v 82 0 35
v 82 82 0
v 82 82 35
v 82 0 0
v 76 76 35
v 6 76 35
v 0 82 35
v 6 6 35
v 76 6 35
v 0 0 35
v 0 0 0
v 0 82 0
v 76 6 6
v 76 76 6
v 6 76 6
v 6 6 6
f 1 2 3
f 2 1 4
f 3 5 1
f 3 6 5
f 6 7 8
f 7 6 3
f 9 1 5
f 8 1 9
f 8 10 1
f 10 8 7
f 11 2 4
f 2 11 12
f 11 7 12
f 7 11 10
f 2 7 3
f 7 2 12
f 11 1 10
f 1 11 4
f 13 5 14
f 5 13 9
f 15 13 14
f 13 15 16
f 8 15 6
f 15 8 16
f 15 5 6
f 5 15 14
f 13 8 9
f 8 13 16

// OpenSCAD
// file: lib/CMSL.scad
/*
 * CMSL - The chrissx Media SCAD library
 * Copyright 2021 chrissx Media, P. C. Häußler
 * For licensing information please refer to the 2nd version of the
 * GNU General Public License, as found in the repository you should have
 * obtained this file from, at https://github.com/pixelcmtd/models/tree/master/LICENSE.
 */

module CMMultiLineText(lines = [], size = 10, font = "Liberation Mono",
                       halign = "left", valign = "baseline",
                       direction = "ltr", hspace = 1, vspace = 3) {
  translate([0, -size, 0]) {
    for (i = [0 : len(lines) - 1]) {
      translate([0 , (-i - 0.5) * vspace, 0]) {
        text(text=lines[i], size=size, font=font, valign=valign, halign=halign,
             direction=direction, spacing=hspace);
      }
    }
  }
}

module CMBox(width=50, height=37.5, wall=1, fronttext=[],
             textsize=1.5, font="Liberation Mono", textdepth=1.5) {
  inner = width - wall * 2;
  union() {
    difference() {
      cube([width, width, height]);
      translate([wall, wall, wall])
        cube([inner, inner, height+1]);
    }
    translate([wall, 0, height-wall]) {
      rotate([90, 0, 0]) {
        linear_extrude(textdepth) {
          CMMultiLineText(fronttext, size=textsize, vspace=textsize, font=font);
        }
      }
    }
  }
}

module CMRing(inner, outer, height) {
  linear_extrude(height) {
    difference() {
      circle(outer);
      circle(inner);
    }
  }
}

module CMGear(inner, outer, height, n, thickness, width) {
  union() {
    CMRing(inner, outer, height);
    for(i = [0:n])
      rotate([0,0,i*360/n])
        translate([inner,0,0])
        cube([outer-inner+thickness, width, height]);
  }
}
// main file
/// An 82²x35 CMBox with a wall-thickness of 6
/// made to be close to the SchoolAmp project.

use <lib/CMSL.scad>

// these measurements are not exact but pretty close
CMBox(width=82, height=35, wall=6);
